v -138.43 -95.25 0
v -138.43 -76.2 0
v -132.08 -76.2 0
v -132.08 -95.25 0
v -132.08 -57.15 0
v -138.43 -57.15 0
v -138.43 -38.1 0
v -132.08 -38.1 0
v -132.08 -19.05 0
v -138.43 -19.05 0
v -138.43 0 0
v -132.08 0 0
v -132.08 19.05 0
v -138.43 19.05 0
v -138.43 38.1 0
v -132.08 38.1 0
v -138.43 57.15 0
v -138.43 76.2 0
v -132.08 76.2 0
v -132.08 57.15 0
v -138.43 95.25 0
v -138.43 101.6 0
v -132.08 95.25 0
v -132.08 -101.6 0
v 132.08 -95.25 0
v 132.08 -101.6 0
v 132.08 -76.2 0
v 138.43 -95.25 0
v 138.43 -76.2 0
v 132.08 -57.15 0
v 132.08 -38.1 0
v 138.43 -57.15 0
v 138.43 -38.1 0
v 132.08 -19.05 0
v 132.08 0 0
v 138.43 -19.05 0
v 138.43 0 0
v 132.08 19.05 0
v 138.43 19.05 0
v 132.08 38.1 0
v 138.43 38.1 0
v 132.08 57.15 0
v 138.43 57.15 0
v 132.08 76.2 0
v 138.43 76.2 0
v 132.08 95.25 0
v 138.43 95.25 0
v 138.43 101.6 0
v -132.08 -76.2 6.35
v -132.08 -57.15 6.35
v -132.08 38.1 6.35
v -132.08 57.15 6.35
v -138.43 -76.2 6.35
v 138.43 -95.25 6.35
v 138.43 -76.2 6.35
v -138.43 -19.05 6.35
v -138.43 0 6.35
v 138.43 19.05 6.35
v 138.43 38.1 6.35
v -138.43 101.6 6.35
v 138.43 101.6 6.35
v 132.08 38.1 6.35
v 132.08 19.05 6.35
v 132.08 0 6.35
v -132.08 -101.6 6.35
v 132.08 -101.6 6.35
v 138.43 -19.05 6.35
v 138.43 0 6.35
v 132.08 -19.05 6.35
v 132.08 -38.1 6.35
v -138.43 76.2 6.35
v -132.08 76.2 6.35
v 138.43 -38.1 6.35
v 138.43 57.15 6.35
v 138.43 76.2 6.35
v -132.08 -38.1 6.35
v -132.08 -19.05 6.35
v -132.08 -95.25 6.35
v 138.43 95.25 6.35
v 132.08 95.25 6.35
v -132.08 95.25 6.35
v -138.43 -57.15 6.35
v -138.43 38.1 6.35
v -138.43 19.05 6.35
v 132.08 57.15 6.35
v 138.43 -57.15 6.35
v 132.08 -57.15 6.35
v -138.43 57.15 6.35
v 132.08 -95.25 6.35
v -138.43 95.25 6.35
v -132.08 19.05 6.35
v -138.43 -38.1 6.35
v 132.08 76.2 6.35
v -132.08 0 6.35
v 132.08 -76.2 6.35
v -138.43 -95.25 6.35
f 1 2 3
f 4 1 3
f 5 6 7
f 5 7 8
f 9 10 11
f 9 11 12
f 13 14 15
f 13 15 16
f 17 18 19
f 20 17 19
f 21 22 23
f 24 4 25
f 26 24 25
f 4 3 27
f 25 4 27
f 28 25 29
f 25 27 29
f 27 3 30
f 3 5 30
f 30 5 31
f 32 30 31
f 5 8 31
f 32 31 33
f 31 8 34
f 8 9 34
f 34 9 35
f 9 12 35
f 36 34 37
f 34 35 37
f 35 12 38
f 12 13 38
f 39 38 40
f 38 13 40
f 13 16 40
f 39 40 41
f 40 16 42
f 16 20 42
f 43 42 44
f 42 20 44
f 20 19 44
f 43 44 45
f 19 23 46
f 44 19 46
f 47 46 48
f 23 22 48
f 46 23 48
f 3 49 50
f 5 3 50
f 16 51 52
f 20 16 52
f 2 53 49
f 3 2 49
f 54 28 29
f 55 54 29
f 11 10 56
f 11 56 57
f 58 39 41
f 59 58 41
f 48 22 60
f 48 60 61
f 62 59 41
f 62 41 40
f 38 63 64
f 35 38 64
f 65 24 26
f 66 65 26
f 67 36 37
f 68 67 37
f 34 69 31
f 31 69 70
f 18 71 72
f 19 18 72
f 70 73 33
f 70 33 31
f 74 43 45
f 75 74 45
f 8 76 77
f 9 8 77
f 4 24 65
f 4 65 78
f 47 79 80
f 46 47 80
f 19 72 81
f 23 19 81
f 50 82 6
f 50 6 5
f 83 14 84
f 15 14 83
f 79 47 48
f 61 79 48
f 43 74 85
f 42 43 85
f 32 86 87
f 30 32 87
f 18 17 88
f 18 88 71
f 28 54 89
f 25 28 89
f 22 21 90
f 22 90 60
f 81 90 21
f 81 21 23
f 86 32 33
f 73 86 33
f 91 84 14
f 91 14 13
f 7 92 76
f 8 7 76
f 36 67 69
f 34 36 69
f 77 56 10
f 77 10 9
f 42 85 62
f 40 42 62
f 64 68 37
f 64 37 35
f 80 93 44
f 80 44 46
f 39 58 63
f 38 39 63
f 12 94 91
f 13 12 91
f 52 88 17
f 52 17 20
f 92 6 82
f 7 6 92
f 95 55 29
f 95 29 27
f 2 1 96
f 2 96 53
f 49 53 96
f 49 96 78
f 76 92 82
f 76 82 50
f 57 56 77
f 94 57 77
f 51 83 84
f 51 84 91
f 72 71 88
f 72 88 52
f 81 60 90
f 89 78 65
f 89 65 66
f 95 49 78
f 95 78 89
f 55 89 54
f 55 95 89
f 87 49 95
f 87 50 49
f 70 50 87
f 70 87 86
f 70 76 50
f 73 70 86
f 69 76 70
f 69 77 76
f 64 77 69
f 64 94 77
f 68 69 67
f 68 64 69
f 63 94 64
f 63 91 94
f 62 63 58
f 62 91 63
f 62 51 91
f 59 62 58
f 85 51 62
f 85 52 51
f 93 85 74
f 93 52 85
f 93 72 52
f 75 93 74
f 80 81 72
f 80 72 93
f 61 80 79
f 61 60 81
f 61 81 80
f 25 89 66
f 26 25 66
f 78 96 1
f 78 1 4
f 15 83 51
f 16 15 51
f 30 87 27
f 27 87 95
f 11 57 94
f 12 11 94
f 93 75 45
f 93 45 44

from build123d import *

# Parameters (mm, degrees)
SKETCH1_W               = 276.86
SKETCH1_H               = 203.2
BOSS_EXTRUDE1_DEPTH     = 6.35
SKETCH2_W               = 6.35
SKETCH2_H               = 19.05
CUT_EXTRUDE1_DEPTH      = 172.830577605
LPATTERN1_COUNT         = 6
LPATTERN1_PITCH         = 38.1
MIRROR1_COPY_1_SKETCH_W = 6.35
MIRROR1_COPY_1_SKETCH_H = 19.05
MIRROR1_COPY_1_DEPTH    = 172.830577605
MIRROR1_COPY_2_SKETCH_W = 6.35
MIRROR1_COPY_2_SKETCH_H = 19.05
MIRROR1_COPY_2_DEPTH    = 172.830577605
MIRROR1_COPY_3_SKETCH_W = 6.35
MIRROR1_COPY_3_SKETCH_H = 19.05
MIRROR1_COPY_3_DEPTH    = 172.830577605
MIRROR1_COPY_4_SKETCH_W = 6.35
MIRROR1_COPY_4_SKETCH_H = 19.05
MIRROR1_COPY_4_DEPTH    = 172.830577605
MIRROR1_COPY_5_SKETCH_W = 6.35
MIRROR1_COPY_5_SKETCH_H = 19.05
MIRROR1_COPY_5_DEPTH    = 172.830577605


with BuildPart() as part:
    # Sketch1 → Boss-Extrude1 (new body)
    with BuildSketch(Plane.XY):
        Rectangle(SKETCH1_W, SKETCH1_H)
    extrude(amount=BOSS_EXTRUDE1_DEPTH)

    # Sketch2 → Cut-Extrude1 (cut, through all)
    with BuildSketch(Plane.XY.offset(6.35)):
        with Locations((-135.255, 85.725)):
            Rectangle(SKETCH2_W, SKETCH2_H)
    cut_extrude1 = extrude(amount=-CUT_EXTRUDE1_DEPTH, mode=Mode.SUBTRACT)

    # LPattern1: Cut-Extrude1 ×6
    with Locations(*[(0, -i * LPATTERN1_PITCH, 0) for i in range(1, LPATTERN1_COUNT)]):
        add(cut_extrude1, mode=Mode.SUBTRACT)

    # Mirror1: Cut-Extrude1 across plane
    add(cut_extrude1.mirror(Plane(origin=(0, 0, 0), x_dir=(0, 0, 1), z_dir=(1, 0, 0))), mode=Mode.SUBTRACT)

    # Mirror1 copy 1 sketch → Mirror1 copy 1 (cut, through all)
    with BuildSketch(Plane(origin=(0, -38.1, 6.35), x_dir=(-1, 0, 0), z_dir=(0, 0, 1))):
        with Locations((-135.255, -85.725)):
            Rectangle(MIRROR1_COPY_1_SKETCH_W, MIRROR1_COPY_1_SKETCH_H)
    extrude(amount=-MIRROR1_COPY_1_DEPTH, mode=Mode.SUBTRACT)

    # Mirror1 copy 2 sketch → Mirror1 copy 2 (cut, through all)
    with BuildSketch(Plane(origin=(0, -76.2, 6.35), x_dir=(-1, 0, 0), z_dir=(0, 0, 1))):
        with Locations((-135.255, -85.725)):
            Rectangle(MIRROR1_COPY_2_SKETCH_W, MIRROR1_COPY_2_SKETCH_H)
    extrude(amount=-MIRROR1_COPY_2_DEPTH, mode=Mode.SUBTRACT)

    # Mirror1 copy 3 sketch → Mirror1 copy 3 (cut, through all)
    with BuildSketch(Plane(origin=(0, -114.3, 6.35), x_dir=(-1, 0, 0), z_dir=(0, 0, 1))):
        with Locations((-135.255, -85.725)):
            Rectangle(MIRROR1_COPY_3_SKETCH_W, MIRROR1_COPY_3_SKETCH_H)
    extrude(amount=-MIRROR1_COPY_3_DEPTH, mode=Mode.SUBTRACT)

    # Mirror1 copy 4 sketch → Mirror1 copy 4 (cut, through all)
    with BuildSketch(Plane(origin=(0, -152.4, 6.35), x_dir=(-1, 0, 0), z_dir=(0, 0, 1))):
        with Locations((-135.255, -85.725)):
            Rectangle(MIRROR1_COPY_4_SKETCH_W, MIRROR1_COPY_4_SKETCH_H)
    extrude(amount=-MIRROR1_COPY_4_DEPTH, mode=Mode.SUBTRACT)

    # Mirror1 copy 5 sketch → Mirror1 copy 5 (cut, through all)
    with BuildSketch(Plane(origin=(0, -190.5, 6.35), x_dir=(-1, 0, 0), z_dir=(0, 0, 1))):
        with Locations((-135.255, -85.725)):
            Rectangle(MIRROR1_COPY_5_SKETCH_W, MIRROR1_COPY_5_SKETCH_H)
    extrude(amount=-MIRROR1_COPY_5_DEPTH, mode=Mode.SUBTRACT)


solid = part.part
